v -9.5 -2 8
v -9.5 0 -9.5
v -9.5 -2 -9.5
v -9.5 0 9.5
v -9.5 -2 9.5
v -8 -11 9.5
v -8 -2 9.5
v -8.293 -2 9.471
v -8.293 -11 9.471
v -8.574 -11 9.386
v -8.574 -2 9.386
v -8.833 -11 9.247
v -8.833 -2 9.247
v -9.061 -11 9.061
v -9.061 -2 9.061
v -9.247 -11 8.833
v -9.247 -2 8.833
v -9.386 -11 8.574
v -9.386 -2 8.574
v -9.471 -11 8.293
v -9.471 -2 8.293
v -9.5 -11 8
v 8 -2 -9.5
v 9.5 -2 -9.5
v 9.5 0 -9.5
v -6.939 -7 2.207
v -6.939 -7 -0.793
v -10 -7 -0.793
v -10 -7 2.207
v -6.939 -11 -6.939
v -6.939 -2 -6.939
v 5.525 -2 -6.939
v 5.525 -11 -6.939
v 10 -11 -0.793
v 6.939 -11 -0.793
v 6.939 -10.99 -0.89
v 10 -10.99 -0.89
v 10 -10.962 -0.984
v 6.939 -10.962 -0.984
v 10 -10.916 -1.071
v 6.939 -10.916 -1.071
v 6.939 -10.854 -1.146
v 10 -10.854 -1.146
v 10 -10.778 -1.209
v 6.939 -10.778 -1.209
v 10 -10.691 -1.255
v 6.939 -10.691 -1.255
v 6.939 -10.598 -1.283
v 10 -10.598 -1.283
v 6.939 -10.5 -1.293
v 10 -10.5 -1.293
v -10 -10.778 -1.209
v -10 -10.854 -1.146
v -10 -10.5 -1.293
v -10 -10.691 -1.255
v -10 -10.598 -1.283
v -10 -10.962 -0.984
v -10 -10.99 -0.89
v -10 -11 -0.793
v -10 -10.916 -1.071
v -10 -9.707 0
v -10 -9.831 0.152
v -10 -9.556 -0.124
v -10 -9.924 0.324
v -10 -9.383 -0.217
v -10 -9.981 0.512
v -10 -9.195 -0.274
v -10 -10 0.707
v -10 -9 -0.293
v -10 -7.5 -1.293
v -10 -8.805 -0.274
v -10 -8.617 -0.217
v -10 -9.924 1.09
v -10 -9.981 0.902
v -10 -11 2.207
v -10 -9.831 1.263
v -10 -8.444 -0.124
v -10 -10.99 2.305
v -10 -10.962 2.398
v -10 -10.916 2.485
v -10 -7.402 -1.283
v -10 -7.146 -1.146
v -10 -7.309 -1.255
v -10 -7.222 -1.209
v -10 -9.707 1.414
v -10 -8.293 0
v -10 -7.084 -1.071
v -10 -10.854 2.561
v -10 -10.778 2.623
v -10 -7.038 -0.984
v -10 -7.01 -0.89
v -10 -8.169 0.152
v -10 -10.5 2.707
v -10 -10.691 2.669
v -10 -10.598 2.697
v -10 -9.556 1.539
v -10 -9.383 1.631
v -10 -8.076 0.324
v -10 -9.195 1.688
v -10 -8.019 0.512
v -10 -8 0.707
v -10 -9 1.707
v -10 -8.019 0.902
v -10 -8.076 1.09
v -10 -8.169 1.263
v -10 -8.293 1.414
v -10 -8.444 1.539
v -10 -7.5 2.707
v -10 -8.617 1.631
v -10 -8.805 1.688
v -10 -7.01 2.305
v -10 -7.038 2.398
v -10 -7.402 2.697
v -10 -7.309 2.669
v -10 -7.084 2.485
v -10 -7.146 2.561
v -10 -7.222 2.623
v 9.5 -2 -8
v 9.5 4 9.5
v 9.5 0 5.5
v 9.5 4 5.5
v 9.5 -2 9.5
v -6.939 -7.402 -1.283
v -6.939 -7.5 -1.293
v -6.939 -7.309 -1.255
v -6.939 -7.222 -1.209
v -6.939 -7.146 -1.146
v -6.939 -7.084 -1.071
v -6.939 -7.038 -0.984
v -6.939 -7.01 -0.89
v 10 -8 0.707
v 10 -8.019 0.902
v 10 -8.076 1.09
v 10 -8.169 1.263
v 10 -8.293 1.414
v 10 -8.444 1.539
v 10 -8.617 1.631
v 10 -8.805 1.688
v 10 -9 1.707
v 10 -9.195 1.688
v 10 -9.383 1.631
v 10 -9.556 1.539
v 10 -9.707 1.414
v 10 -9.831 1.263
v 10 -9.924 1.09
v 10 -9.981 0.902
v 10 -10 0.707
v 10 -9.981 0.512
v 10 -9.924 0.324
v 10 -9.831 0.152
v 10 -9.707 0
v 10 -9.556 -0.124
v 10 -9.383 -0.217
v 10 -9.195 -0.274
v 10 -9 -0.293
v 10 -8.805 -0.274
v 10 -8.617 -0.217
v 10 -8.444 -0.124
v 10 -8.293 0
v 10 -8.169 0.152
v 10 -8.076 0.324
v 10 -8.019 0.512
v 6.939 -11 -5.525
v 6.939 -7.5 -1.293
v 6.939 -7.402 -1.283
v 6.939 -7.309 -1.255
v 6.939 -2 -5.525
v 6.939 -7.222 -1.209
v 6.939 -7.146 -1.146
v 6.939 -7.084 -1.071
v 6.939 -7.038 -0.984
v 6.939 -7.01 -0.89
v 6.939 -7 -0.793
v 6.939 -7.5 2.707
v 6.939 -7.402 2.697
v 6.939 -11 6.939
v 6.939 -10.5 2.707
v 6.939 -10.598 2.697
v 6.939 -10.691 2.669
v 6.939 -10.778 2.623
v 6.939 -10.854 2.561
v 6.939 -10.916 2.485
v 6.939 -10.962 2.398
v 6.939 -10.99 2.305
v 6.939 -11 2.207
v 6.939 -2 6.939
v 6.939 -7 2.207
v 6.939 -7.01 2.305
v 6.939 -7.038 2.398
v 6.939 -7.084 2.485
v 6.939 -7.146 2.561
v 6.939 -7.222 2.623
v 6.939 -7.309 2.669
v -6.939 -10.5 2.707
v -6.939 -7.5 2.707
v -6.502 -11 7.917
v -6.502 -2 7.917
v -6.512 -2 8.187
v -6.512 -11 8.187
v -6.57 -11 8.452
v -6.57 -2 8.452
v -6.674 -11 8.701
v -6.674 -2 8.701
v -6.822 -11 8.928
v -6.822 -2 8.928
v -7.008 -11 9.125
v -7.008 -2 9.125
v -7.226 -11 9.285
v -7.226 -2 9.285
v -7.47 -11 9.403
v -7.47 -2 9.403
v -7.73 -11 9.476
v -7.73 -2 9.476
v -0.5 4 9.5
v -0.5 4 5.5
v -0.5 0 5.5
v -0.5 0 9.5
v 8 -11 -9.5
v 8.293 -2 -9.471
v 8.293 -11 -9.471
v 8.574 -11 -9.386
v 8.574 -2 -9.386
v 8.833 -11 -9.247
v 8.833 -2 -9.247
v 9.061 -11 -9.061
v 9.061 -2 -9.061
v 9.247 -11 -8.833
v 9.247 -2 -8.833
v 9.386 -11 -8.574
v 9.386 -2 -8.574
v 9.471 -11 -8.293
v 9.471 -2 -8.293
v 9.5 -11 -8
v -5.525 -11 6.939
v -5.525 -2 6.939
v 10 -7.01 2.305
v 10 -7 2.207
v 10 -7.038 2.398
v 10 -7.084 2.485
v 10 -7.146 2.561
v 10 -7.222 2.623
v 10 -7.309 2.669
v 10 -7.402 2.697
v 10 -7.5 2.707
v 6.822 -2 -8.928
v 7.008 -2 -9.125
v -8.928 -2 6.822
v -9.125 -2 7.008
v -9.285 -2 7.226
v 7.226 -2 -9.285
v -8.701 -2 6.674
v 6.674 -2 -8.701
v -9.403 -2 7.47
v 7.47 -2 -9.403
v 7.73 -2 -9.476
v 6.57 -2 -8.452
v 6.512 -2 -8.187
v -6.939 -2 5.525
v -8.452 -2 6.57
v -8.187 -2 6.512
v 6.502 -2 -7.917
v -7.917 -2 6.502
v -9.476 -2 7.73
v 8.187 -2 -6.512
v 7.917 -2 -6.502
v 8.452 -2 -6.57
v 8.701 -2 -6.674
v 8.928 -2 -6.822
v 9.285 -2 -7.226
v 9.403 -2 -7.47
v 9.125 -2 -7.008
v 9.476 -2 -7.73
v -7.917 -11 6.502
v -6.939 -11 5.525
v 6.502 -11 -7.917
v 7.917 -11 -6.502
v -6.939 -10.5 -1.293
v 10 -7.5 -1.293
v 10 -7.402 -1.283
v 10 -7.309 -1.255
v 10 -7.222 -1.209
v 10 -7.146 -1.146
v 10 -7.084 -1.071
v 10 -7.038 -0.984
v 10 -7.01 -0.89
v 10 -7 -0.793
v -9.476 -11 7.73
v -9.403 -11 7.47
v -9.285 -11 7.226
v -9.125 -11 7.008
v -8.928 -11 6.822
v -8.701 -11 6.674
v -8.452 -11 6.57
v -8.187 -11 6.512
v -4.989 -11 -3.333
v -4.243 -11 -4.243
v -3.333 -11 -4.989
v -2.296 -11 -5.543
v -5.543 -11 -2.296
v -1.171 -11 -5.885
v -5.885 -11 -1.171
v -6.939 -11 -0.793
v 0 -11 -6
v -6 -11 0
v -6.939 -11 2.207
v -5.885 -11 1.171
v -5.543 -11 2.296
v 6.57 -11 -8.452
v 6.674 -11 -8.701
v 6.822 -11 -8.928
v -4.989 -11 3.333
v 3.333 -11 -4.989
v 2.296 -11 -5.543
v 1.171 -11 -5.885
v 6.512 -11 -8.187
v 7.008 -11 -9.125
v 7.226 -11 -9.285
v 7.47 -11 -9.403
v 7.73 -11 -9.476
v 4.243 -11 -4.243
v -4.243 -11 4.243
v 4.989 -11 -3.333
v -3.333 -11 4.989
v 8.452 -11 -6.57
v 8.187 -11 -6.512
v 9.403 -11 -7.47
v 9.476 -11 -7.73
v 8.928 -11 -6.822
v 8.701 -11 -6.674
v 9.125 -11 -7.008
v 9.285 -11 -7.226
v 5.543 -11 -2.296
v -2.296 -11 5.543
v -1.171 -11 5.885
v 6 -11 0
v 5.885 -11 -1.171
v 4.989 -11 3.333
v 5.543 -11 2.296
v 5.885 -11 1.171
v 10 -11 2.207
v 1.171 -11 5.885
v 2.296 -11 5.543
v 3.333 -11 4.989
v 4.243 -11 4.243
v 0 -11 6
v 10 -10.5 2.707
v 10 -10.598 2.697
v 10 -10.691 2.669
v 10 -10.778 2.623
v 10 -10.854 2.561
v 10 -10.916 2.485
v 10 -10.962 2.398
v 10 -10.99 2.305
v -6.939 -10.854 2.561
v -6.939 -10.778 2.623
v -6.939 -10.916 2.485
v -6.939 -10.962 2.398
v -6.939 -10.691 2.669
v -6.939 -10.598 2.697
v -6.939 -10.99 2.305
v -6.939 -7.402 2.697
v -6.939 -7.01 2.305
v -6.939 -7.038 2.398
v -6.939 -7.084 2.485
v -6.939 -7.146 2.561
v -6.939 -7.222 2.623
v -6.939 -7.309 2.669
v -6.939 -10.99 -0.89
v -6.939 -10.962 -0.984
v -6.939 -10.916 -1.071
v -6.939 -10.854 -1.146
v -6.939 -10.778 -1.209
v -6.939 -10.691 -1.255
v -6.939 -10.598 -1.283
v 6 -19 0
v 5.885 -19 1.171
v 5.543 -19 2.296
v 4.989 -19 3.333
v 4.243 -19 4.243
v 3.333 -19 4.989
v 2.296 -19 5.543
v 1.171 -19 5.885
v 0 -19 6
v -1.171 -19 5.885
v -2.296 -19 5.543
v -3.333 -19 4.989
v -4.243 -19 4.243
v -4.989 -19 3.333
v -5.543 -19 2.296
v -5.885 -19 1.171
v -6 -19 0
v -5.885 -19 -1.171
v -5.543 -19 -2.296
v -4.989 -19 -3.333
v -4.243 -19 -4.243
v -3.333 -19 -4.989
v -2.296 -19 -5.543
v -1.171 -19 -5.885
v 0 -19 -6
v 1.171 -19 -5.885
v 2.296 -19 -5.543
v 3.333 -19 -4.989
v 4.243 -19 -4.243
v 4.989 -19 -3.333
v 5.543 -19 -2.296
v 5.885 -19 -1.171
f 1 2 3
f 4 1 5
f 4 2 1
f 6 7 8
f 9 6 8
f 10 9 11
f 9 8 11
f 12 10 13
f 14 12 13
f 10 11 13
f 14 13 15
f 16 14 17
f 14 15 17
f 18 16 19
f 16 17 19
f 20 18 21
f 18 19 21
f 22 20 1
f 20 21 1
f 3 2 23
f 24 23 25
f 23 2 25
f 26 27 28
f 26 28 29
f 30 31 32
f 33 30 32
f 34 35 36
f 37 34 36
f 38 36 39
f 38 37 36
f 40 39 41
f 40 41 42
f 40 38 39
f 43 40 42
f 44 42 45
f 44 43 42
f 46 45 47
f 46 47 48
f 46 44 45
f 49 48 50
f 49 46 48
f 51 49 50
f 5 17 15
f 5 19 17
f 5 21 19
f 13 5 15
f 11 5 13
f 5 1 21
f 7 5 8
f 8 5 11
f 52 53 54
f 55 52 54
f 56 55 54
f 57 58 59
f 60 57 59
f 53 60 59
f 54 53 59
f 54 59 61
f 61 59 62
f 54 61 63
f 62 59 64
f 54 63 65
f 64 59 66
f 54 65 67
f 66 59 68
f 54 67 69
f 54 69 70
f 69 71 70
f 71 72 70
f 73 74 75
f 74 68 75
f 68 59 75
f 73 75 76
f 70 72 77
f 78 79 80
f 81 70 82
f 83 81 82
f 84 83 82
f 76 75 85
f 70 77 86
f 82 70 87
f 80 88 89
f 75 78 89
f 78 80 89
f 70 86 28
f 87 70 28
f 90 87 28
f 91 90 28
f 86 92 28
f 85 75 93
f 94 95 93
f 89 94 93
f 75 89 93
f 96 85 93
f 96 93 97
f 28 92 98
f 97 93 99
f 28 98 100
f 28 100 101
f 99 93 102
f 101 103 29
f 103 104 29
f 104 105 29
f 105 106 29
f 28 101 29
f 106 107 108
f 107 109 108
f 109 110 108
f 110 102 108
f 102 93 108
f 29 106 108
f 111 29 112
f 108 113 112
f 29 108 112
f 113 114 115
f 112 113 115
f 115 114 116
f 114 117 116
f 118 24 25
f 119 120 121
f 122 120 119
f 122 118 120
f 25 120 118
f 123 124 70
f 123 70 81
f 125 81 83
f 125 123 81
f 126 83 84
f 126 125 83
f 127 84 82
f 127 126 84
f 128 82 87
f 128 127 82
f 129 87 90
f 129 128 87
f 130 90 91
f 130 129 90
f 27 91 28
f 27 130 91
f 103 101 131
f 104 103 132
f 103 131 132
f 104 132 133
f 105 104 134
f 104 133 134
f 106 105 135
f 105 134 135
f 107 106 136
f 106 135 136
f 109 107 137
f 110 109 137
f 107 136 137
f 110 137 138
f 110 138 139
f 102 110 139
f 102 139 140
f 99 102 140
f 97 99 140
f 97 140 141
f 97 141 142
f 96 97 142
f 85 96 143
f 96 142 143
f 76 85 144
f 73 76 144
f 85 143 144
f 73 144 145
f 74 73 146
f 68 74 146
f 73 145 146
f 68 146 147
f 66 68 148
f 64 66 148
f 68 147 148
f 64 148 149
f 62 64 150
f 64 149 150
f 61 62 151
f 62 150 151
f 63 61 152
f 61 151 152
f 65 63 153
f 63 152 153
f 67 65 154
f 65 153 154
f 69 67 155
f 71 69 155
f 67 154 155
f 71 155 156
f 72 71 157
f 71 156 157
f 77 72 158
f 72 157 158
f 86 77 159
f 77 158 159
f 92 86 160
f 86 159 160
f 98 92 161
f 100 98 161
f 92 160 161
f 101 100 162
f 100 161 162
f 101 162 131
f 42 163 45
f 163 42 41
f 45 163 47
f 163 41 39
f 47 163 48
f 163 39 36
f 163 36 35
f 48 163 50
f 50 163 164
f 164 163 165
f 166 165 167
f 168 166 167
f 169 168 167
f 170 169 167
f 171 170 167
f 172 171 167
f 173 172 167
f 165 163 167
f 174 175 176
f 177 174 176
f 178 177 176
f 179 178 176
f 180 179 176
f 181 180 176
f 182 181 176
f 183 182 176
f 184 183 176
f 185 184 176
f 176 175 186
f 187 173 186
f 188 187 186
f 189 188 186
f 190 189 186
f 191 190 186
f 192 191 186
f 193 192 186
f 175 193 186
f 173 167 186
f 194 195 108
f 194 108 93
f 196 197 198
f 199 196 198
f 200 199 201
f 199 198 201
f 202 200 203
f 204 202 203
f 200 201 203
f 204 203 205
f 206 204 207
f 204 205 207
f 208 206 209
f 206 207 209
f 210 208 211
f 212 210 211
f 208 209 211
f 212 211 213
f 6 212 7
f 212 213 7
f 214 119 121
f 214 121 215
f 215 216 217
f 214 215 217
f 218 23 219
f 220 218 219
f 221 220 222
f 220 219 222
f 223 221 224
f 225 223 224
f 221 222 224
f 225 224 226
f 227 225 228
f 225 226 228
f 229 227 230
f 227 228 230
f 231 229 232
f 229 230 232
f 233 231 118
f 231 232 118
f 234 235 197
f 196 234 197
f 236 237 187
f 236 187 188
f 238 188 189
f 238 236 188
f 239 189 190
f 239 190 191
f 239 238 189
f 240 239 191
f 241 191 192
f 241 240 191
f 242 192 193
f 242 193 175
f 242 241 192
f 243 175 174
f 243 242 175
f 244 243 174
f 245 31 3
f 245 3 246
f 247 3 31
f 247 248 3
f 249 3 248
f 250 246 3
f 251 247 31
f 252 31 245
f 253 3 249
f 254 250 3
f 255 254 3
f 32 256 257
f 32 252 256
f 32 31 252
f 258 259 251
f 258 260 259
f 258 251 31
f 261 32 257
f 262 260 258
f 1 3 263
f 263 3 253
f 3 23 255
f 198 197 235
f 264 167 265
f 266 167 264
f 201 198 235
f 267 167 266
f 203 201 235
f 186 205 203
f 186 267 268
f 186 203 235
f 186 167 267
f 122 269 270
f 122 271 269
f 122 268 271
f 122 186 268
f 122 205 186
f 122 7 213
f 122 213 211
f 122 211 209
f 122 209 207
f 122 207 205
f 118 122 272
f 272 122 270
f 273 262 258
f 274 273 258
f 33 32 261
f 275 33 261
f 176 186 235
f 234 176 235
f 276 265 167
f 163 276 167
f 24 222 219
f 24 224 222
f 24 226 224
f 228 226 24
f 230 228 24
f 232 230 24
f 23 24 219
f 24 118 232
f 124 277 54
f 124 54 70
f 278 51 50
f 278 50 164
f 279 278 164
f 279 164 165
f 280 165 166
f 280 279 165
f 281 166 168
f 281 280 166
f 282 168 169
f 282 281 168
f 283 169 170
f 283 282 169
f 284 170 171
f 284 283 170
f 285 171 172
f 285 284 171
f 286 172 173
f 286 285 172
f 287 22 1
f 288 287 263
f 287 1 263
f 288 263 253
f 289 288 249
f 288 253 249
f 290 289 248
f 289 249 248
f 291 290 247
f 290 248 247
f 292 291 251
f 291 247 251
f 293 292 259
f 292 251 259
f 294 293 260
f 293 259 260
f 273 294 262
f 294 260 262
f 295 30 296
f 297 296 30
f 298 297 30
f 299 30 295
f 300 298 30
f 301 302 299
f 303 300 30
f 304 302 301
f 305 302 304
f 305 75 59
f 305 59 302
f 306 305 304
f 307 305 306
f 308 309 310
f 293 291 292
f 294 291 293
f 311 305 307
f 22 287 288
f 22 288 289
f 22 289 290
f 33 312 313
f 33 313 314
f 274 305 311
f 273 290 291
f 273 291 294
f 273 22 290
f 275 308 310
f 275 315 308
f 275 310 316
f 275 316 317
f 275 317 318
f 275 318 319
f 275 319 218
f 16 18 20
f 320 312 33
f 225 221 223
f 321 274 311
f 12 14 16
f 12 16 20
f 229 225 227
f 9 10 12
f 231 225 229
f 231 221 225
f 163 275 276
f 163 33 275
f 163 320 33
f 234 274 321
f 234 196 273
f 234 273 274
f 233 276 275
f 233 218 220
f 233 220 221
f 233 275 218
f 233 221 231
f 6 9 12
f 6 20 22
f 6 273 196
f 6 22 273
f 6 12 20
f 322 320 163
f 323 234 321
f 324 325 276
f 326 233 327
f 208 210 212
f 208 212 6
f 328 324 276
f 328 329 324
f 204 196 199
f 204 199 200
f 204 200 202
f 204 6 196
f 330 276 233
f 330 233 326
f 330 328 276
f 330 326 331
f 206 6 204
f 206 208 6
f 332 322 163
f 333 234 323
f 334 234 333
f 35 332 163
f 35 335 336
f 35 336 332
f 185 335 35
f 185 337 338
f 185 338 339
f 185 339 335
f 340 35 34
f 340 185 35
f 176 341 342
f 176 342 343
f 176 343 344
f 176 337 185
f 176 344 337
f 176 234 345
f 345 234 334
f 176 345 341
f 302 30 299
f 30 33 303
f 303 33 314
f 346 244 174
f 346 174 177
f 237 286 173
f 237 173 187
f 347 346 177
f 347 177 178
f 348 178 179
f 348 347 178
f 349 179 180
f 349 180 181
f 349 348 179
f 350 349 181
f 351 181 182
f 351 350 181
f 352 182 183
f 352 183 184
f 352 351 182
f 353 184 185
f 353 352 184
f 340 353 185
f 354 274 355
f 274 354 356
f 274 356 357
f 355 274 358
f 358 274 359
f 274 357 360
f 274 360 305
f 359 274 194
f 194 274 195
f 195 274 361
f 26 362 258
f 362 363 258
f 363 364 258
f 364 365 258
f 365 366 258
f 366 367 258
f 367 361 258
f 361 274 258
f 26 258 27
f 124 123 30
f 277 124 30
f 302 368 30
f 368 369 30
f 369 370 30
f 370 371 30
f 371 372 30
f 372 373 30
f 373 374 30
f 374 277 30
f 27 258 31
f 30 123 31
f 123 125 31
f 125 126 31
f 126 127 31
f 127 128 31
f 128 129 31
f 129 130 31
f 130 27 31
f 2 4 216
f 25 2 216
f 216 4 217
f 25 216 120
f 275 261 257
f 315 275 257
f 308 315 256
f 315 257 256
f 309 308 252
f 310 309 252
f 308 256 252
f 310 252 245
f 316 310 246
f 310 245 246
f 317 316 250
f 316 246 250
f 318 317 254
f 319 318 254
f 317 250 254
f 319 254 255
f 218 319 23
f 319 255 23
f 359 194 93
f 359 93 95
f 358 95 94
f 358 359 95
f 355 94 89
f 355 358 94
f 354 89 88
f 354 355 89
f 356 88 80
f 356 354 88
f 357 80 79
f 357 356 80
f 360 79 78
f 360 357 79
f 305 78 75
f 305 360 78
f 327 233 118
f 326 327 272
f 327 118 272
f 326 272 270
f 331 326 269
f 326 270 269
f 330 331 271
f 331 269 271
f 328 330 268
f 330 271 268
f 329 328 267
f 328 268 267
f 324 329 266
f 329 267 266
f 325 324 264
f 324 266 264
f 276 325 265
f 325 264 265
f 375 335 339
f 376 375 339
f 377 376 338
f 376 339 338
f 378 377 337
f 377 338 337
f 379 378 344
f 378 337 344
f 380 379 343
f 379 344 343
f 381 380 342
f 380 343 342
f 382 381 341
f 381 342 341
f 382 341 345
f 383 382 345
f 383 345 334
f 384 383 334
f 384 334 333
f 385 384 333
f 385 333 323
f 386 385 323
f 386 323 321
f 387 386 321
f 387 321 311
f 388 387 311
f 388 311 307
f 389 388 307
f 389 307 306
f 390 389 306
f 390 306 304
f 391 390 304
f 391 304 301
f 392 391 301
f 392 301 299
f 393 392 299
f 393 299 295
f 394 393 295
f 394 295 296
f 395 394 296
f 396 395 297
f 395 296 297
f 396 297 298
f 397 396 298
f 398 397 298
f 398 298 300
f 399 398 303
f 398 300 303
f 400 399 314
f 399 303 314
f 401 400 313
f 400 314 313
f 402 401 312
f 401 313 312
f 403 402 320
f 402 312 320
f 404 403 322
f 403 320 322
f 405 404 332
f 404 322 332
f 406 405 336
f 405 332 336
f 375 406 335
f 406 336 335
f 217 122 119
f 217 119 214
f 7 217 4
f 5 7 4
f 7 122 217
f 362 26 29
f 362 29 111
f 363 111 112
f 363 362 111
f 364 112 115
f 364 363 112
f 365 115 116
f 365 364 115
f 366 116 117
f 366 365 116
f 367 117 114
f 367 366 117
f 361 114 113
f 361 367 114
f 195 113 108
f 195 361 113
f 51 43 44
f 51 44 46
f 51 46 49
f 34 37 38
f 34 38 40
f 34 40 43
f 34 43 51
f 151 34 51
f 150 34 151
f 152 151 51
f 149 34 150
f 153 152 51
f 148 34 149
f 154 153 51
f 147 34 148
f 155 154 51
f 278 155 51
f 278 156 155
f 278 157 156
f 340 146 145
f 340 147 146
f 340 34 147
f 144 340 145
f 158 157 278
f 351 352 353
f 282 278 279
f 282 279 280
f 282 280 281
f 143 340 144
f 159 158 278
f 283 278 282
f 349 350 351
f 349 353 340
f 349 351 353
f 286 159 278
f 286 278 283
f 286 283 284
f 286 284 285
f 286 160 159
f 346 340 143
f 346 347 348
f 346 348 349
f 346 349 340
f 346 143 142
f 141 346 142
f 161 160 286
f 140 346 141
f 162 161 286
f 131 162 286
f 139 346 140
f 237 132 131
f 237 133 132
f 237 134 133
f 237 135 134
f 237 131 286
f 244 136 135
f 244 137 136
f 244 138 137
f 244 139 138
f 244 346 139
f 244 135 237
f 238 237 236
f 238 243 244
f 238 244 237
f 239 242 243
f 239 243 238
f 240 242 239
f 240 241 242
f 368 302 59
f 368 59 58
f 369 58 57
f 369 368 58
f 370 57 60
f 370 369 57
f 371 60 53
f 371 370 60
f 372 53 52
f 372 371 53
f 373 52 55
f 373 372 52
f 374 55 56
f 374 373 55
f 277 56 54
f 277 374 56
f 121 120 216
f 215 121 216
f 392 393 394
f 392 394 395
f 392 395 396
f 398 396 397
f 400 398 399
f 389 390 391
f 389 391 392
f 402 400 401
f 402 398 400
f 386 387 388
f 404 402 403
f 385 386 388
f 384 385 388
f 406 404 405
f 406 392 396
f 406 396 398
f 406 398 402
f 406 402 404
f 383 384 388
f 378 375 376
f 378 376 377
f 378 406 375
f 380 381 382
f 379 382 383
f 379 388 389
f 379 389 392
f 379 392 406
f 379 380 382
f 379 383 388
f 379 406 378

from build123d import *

# Parameters (mm, degrees)
F0_W      = 19
F0_H      = 19
F1_DEPTH  = 2
F4_DEPTH  = 9
F2_R      = 6
F5_DEPTH  = 17
F7_DEPTH  = 10
F10_R     = 1
F11_DEPTH = 20
F12_W     = 10
F12_H     = 4
F13_DEPTH = 4


# Not quite as in the source:
# - a feature of the source that left no trace in its solid (it failed there, or was rolled back) is left out
# - a feature names something its author has since deleted; it is built from what else it names


with BuildPart() as f1:
    # F0 (on Front) → F1 (new body)
    with BuildSketch(Plane.XZ):
        Rectangle(F0_W, F0_H)
    extrude(amount=F1_DEPTH)

    # F3 (on face) → F4 (join)
    with BuildSketch(Plane.XZ.offset(2)):
        with BuildLine():
            Line((-5.5251262658, 6.9393398282), (-6.5023238038, 7.9165373661))
            ThreePointArc((-6.5023238038, 7.9165373661), (-6.9102307697, 9.0307293654), (-8, 9.5))
            ThreePointArc((-8, 9.5), (-9.0606601718, 9.0606601718), (-9.5, 8))
            ThreePointArc((-9.5, 8), (-9.0307293654, 6.9102307697), (-7.9165373661, 6.5023238038))
            Line((-7.9165373661, 6.5023238038), (-6.9393398282, 5.5251262658))
            Line((-6.9393398282, 5.5251262658), (-6.9393398282, -6.9393398282))
            Line((-6.9393398282, -6.9393398282), (5.5251262658, -6.9393398282))
            Line((5.5251262658, -6.9393398282), (6.5023238038, -7.9165373661))
            ThreePointArc((6.5023238038, -7.9165373661), (6.9102307697, -9.0307293654), (8, -9.5))
            ThreePointArc((8, -9.5), (9.0606601718, -9.0606601718), (9.5, -8))
            ThreePointArc((9.5, -8), (9.0307293654, -6.9102307697), (7.9165373661, -6.5023238038))
            Line((7.9165373661, -6.5023238038), (6.9393398282, -5.5251262658))
            Line((6.9393398282, -5.5251262658), (6.9393398282, 6.9393398282))
            Line((6.9393398282, 6.9393398282), (-5.5251262658, 6.9393398282))
        make_face()
    extrude(amount=F4_DEPTH)

    # F2 (on face) → F5 (join)
    with BuildSketch(Plane.XZ.offset(2)):
        Circle(F2_R)
    extrude(amount=F5_DEPTH)

    # F6 (on Right) → F7 (join, symmetric)
    with BuildSketch(Plane.YZ):
        with BuildLine():
            ThreePointArc((-7, 2.2071067812), (-7.1464466094, 2.5606601718), (-7.5, 2.7071067812))
            Line((-7.5, 2.7071067812), (-10.5, 2.7071067812))
            ThreePointArc((-10.5, 2.7071067812), (-10.8535533906, 2.5606601718), (-11, 2.2071067812))
            Line((-11, 2.2071067812), (-11, -0.7928932188))
            ThreePointArc((-11, -0.7928932188), (-10.8535533906, -1.1464466094), (-10.5, -1.2928932188))
            Line((-10.5, -1.2928932188), (-7.5, -1.2928932188))
            ThreePointArc((-7.5, -1.2928932188), (-7.1464466094, -1.1464466094), (-7, -0.7928932188))
            Line((-7, -0.7928932188), (-7, 2.2071067812))
        make_face()
    extrude(amount=F7_DEPTH, both=True)

    # F10 (on face) → F11 (cut, symmetric)
    with BuildSketch(Plane.YZ.offset(6.9393398282)):
        with Locations((-9, 0.7071067812)):
            Circle(F10_R)
    extrude(amount=F11_DEPTH, both=True, mode=Mode.SUBTRACT)

    # F12 (on face) → F13 (join)
    with BuildSketch(Plane(origin=(0, 0, 0), x_dir=(-1, 0, 0), z_dir=(0, 1, 0))):
        with Locations((-4.5, 7.5)):
            Rectangle(F12_W, F12_H)
    extrude(amount=F13_DEPTH)


solid = f1.part
